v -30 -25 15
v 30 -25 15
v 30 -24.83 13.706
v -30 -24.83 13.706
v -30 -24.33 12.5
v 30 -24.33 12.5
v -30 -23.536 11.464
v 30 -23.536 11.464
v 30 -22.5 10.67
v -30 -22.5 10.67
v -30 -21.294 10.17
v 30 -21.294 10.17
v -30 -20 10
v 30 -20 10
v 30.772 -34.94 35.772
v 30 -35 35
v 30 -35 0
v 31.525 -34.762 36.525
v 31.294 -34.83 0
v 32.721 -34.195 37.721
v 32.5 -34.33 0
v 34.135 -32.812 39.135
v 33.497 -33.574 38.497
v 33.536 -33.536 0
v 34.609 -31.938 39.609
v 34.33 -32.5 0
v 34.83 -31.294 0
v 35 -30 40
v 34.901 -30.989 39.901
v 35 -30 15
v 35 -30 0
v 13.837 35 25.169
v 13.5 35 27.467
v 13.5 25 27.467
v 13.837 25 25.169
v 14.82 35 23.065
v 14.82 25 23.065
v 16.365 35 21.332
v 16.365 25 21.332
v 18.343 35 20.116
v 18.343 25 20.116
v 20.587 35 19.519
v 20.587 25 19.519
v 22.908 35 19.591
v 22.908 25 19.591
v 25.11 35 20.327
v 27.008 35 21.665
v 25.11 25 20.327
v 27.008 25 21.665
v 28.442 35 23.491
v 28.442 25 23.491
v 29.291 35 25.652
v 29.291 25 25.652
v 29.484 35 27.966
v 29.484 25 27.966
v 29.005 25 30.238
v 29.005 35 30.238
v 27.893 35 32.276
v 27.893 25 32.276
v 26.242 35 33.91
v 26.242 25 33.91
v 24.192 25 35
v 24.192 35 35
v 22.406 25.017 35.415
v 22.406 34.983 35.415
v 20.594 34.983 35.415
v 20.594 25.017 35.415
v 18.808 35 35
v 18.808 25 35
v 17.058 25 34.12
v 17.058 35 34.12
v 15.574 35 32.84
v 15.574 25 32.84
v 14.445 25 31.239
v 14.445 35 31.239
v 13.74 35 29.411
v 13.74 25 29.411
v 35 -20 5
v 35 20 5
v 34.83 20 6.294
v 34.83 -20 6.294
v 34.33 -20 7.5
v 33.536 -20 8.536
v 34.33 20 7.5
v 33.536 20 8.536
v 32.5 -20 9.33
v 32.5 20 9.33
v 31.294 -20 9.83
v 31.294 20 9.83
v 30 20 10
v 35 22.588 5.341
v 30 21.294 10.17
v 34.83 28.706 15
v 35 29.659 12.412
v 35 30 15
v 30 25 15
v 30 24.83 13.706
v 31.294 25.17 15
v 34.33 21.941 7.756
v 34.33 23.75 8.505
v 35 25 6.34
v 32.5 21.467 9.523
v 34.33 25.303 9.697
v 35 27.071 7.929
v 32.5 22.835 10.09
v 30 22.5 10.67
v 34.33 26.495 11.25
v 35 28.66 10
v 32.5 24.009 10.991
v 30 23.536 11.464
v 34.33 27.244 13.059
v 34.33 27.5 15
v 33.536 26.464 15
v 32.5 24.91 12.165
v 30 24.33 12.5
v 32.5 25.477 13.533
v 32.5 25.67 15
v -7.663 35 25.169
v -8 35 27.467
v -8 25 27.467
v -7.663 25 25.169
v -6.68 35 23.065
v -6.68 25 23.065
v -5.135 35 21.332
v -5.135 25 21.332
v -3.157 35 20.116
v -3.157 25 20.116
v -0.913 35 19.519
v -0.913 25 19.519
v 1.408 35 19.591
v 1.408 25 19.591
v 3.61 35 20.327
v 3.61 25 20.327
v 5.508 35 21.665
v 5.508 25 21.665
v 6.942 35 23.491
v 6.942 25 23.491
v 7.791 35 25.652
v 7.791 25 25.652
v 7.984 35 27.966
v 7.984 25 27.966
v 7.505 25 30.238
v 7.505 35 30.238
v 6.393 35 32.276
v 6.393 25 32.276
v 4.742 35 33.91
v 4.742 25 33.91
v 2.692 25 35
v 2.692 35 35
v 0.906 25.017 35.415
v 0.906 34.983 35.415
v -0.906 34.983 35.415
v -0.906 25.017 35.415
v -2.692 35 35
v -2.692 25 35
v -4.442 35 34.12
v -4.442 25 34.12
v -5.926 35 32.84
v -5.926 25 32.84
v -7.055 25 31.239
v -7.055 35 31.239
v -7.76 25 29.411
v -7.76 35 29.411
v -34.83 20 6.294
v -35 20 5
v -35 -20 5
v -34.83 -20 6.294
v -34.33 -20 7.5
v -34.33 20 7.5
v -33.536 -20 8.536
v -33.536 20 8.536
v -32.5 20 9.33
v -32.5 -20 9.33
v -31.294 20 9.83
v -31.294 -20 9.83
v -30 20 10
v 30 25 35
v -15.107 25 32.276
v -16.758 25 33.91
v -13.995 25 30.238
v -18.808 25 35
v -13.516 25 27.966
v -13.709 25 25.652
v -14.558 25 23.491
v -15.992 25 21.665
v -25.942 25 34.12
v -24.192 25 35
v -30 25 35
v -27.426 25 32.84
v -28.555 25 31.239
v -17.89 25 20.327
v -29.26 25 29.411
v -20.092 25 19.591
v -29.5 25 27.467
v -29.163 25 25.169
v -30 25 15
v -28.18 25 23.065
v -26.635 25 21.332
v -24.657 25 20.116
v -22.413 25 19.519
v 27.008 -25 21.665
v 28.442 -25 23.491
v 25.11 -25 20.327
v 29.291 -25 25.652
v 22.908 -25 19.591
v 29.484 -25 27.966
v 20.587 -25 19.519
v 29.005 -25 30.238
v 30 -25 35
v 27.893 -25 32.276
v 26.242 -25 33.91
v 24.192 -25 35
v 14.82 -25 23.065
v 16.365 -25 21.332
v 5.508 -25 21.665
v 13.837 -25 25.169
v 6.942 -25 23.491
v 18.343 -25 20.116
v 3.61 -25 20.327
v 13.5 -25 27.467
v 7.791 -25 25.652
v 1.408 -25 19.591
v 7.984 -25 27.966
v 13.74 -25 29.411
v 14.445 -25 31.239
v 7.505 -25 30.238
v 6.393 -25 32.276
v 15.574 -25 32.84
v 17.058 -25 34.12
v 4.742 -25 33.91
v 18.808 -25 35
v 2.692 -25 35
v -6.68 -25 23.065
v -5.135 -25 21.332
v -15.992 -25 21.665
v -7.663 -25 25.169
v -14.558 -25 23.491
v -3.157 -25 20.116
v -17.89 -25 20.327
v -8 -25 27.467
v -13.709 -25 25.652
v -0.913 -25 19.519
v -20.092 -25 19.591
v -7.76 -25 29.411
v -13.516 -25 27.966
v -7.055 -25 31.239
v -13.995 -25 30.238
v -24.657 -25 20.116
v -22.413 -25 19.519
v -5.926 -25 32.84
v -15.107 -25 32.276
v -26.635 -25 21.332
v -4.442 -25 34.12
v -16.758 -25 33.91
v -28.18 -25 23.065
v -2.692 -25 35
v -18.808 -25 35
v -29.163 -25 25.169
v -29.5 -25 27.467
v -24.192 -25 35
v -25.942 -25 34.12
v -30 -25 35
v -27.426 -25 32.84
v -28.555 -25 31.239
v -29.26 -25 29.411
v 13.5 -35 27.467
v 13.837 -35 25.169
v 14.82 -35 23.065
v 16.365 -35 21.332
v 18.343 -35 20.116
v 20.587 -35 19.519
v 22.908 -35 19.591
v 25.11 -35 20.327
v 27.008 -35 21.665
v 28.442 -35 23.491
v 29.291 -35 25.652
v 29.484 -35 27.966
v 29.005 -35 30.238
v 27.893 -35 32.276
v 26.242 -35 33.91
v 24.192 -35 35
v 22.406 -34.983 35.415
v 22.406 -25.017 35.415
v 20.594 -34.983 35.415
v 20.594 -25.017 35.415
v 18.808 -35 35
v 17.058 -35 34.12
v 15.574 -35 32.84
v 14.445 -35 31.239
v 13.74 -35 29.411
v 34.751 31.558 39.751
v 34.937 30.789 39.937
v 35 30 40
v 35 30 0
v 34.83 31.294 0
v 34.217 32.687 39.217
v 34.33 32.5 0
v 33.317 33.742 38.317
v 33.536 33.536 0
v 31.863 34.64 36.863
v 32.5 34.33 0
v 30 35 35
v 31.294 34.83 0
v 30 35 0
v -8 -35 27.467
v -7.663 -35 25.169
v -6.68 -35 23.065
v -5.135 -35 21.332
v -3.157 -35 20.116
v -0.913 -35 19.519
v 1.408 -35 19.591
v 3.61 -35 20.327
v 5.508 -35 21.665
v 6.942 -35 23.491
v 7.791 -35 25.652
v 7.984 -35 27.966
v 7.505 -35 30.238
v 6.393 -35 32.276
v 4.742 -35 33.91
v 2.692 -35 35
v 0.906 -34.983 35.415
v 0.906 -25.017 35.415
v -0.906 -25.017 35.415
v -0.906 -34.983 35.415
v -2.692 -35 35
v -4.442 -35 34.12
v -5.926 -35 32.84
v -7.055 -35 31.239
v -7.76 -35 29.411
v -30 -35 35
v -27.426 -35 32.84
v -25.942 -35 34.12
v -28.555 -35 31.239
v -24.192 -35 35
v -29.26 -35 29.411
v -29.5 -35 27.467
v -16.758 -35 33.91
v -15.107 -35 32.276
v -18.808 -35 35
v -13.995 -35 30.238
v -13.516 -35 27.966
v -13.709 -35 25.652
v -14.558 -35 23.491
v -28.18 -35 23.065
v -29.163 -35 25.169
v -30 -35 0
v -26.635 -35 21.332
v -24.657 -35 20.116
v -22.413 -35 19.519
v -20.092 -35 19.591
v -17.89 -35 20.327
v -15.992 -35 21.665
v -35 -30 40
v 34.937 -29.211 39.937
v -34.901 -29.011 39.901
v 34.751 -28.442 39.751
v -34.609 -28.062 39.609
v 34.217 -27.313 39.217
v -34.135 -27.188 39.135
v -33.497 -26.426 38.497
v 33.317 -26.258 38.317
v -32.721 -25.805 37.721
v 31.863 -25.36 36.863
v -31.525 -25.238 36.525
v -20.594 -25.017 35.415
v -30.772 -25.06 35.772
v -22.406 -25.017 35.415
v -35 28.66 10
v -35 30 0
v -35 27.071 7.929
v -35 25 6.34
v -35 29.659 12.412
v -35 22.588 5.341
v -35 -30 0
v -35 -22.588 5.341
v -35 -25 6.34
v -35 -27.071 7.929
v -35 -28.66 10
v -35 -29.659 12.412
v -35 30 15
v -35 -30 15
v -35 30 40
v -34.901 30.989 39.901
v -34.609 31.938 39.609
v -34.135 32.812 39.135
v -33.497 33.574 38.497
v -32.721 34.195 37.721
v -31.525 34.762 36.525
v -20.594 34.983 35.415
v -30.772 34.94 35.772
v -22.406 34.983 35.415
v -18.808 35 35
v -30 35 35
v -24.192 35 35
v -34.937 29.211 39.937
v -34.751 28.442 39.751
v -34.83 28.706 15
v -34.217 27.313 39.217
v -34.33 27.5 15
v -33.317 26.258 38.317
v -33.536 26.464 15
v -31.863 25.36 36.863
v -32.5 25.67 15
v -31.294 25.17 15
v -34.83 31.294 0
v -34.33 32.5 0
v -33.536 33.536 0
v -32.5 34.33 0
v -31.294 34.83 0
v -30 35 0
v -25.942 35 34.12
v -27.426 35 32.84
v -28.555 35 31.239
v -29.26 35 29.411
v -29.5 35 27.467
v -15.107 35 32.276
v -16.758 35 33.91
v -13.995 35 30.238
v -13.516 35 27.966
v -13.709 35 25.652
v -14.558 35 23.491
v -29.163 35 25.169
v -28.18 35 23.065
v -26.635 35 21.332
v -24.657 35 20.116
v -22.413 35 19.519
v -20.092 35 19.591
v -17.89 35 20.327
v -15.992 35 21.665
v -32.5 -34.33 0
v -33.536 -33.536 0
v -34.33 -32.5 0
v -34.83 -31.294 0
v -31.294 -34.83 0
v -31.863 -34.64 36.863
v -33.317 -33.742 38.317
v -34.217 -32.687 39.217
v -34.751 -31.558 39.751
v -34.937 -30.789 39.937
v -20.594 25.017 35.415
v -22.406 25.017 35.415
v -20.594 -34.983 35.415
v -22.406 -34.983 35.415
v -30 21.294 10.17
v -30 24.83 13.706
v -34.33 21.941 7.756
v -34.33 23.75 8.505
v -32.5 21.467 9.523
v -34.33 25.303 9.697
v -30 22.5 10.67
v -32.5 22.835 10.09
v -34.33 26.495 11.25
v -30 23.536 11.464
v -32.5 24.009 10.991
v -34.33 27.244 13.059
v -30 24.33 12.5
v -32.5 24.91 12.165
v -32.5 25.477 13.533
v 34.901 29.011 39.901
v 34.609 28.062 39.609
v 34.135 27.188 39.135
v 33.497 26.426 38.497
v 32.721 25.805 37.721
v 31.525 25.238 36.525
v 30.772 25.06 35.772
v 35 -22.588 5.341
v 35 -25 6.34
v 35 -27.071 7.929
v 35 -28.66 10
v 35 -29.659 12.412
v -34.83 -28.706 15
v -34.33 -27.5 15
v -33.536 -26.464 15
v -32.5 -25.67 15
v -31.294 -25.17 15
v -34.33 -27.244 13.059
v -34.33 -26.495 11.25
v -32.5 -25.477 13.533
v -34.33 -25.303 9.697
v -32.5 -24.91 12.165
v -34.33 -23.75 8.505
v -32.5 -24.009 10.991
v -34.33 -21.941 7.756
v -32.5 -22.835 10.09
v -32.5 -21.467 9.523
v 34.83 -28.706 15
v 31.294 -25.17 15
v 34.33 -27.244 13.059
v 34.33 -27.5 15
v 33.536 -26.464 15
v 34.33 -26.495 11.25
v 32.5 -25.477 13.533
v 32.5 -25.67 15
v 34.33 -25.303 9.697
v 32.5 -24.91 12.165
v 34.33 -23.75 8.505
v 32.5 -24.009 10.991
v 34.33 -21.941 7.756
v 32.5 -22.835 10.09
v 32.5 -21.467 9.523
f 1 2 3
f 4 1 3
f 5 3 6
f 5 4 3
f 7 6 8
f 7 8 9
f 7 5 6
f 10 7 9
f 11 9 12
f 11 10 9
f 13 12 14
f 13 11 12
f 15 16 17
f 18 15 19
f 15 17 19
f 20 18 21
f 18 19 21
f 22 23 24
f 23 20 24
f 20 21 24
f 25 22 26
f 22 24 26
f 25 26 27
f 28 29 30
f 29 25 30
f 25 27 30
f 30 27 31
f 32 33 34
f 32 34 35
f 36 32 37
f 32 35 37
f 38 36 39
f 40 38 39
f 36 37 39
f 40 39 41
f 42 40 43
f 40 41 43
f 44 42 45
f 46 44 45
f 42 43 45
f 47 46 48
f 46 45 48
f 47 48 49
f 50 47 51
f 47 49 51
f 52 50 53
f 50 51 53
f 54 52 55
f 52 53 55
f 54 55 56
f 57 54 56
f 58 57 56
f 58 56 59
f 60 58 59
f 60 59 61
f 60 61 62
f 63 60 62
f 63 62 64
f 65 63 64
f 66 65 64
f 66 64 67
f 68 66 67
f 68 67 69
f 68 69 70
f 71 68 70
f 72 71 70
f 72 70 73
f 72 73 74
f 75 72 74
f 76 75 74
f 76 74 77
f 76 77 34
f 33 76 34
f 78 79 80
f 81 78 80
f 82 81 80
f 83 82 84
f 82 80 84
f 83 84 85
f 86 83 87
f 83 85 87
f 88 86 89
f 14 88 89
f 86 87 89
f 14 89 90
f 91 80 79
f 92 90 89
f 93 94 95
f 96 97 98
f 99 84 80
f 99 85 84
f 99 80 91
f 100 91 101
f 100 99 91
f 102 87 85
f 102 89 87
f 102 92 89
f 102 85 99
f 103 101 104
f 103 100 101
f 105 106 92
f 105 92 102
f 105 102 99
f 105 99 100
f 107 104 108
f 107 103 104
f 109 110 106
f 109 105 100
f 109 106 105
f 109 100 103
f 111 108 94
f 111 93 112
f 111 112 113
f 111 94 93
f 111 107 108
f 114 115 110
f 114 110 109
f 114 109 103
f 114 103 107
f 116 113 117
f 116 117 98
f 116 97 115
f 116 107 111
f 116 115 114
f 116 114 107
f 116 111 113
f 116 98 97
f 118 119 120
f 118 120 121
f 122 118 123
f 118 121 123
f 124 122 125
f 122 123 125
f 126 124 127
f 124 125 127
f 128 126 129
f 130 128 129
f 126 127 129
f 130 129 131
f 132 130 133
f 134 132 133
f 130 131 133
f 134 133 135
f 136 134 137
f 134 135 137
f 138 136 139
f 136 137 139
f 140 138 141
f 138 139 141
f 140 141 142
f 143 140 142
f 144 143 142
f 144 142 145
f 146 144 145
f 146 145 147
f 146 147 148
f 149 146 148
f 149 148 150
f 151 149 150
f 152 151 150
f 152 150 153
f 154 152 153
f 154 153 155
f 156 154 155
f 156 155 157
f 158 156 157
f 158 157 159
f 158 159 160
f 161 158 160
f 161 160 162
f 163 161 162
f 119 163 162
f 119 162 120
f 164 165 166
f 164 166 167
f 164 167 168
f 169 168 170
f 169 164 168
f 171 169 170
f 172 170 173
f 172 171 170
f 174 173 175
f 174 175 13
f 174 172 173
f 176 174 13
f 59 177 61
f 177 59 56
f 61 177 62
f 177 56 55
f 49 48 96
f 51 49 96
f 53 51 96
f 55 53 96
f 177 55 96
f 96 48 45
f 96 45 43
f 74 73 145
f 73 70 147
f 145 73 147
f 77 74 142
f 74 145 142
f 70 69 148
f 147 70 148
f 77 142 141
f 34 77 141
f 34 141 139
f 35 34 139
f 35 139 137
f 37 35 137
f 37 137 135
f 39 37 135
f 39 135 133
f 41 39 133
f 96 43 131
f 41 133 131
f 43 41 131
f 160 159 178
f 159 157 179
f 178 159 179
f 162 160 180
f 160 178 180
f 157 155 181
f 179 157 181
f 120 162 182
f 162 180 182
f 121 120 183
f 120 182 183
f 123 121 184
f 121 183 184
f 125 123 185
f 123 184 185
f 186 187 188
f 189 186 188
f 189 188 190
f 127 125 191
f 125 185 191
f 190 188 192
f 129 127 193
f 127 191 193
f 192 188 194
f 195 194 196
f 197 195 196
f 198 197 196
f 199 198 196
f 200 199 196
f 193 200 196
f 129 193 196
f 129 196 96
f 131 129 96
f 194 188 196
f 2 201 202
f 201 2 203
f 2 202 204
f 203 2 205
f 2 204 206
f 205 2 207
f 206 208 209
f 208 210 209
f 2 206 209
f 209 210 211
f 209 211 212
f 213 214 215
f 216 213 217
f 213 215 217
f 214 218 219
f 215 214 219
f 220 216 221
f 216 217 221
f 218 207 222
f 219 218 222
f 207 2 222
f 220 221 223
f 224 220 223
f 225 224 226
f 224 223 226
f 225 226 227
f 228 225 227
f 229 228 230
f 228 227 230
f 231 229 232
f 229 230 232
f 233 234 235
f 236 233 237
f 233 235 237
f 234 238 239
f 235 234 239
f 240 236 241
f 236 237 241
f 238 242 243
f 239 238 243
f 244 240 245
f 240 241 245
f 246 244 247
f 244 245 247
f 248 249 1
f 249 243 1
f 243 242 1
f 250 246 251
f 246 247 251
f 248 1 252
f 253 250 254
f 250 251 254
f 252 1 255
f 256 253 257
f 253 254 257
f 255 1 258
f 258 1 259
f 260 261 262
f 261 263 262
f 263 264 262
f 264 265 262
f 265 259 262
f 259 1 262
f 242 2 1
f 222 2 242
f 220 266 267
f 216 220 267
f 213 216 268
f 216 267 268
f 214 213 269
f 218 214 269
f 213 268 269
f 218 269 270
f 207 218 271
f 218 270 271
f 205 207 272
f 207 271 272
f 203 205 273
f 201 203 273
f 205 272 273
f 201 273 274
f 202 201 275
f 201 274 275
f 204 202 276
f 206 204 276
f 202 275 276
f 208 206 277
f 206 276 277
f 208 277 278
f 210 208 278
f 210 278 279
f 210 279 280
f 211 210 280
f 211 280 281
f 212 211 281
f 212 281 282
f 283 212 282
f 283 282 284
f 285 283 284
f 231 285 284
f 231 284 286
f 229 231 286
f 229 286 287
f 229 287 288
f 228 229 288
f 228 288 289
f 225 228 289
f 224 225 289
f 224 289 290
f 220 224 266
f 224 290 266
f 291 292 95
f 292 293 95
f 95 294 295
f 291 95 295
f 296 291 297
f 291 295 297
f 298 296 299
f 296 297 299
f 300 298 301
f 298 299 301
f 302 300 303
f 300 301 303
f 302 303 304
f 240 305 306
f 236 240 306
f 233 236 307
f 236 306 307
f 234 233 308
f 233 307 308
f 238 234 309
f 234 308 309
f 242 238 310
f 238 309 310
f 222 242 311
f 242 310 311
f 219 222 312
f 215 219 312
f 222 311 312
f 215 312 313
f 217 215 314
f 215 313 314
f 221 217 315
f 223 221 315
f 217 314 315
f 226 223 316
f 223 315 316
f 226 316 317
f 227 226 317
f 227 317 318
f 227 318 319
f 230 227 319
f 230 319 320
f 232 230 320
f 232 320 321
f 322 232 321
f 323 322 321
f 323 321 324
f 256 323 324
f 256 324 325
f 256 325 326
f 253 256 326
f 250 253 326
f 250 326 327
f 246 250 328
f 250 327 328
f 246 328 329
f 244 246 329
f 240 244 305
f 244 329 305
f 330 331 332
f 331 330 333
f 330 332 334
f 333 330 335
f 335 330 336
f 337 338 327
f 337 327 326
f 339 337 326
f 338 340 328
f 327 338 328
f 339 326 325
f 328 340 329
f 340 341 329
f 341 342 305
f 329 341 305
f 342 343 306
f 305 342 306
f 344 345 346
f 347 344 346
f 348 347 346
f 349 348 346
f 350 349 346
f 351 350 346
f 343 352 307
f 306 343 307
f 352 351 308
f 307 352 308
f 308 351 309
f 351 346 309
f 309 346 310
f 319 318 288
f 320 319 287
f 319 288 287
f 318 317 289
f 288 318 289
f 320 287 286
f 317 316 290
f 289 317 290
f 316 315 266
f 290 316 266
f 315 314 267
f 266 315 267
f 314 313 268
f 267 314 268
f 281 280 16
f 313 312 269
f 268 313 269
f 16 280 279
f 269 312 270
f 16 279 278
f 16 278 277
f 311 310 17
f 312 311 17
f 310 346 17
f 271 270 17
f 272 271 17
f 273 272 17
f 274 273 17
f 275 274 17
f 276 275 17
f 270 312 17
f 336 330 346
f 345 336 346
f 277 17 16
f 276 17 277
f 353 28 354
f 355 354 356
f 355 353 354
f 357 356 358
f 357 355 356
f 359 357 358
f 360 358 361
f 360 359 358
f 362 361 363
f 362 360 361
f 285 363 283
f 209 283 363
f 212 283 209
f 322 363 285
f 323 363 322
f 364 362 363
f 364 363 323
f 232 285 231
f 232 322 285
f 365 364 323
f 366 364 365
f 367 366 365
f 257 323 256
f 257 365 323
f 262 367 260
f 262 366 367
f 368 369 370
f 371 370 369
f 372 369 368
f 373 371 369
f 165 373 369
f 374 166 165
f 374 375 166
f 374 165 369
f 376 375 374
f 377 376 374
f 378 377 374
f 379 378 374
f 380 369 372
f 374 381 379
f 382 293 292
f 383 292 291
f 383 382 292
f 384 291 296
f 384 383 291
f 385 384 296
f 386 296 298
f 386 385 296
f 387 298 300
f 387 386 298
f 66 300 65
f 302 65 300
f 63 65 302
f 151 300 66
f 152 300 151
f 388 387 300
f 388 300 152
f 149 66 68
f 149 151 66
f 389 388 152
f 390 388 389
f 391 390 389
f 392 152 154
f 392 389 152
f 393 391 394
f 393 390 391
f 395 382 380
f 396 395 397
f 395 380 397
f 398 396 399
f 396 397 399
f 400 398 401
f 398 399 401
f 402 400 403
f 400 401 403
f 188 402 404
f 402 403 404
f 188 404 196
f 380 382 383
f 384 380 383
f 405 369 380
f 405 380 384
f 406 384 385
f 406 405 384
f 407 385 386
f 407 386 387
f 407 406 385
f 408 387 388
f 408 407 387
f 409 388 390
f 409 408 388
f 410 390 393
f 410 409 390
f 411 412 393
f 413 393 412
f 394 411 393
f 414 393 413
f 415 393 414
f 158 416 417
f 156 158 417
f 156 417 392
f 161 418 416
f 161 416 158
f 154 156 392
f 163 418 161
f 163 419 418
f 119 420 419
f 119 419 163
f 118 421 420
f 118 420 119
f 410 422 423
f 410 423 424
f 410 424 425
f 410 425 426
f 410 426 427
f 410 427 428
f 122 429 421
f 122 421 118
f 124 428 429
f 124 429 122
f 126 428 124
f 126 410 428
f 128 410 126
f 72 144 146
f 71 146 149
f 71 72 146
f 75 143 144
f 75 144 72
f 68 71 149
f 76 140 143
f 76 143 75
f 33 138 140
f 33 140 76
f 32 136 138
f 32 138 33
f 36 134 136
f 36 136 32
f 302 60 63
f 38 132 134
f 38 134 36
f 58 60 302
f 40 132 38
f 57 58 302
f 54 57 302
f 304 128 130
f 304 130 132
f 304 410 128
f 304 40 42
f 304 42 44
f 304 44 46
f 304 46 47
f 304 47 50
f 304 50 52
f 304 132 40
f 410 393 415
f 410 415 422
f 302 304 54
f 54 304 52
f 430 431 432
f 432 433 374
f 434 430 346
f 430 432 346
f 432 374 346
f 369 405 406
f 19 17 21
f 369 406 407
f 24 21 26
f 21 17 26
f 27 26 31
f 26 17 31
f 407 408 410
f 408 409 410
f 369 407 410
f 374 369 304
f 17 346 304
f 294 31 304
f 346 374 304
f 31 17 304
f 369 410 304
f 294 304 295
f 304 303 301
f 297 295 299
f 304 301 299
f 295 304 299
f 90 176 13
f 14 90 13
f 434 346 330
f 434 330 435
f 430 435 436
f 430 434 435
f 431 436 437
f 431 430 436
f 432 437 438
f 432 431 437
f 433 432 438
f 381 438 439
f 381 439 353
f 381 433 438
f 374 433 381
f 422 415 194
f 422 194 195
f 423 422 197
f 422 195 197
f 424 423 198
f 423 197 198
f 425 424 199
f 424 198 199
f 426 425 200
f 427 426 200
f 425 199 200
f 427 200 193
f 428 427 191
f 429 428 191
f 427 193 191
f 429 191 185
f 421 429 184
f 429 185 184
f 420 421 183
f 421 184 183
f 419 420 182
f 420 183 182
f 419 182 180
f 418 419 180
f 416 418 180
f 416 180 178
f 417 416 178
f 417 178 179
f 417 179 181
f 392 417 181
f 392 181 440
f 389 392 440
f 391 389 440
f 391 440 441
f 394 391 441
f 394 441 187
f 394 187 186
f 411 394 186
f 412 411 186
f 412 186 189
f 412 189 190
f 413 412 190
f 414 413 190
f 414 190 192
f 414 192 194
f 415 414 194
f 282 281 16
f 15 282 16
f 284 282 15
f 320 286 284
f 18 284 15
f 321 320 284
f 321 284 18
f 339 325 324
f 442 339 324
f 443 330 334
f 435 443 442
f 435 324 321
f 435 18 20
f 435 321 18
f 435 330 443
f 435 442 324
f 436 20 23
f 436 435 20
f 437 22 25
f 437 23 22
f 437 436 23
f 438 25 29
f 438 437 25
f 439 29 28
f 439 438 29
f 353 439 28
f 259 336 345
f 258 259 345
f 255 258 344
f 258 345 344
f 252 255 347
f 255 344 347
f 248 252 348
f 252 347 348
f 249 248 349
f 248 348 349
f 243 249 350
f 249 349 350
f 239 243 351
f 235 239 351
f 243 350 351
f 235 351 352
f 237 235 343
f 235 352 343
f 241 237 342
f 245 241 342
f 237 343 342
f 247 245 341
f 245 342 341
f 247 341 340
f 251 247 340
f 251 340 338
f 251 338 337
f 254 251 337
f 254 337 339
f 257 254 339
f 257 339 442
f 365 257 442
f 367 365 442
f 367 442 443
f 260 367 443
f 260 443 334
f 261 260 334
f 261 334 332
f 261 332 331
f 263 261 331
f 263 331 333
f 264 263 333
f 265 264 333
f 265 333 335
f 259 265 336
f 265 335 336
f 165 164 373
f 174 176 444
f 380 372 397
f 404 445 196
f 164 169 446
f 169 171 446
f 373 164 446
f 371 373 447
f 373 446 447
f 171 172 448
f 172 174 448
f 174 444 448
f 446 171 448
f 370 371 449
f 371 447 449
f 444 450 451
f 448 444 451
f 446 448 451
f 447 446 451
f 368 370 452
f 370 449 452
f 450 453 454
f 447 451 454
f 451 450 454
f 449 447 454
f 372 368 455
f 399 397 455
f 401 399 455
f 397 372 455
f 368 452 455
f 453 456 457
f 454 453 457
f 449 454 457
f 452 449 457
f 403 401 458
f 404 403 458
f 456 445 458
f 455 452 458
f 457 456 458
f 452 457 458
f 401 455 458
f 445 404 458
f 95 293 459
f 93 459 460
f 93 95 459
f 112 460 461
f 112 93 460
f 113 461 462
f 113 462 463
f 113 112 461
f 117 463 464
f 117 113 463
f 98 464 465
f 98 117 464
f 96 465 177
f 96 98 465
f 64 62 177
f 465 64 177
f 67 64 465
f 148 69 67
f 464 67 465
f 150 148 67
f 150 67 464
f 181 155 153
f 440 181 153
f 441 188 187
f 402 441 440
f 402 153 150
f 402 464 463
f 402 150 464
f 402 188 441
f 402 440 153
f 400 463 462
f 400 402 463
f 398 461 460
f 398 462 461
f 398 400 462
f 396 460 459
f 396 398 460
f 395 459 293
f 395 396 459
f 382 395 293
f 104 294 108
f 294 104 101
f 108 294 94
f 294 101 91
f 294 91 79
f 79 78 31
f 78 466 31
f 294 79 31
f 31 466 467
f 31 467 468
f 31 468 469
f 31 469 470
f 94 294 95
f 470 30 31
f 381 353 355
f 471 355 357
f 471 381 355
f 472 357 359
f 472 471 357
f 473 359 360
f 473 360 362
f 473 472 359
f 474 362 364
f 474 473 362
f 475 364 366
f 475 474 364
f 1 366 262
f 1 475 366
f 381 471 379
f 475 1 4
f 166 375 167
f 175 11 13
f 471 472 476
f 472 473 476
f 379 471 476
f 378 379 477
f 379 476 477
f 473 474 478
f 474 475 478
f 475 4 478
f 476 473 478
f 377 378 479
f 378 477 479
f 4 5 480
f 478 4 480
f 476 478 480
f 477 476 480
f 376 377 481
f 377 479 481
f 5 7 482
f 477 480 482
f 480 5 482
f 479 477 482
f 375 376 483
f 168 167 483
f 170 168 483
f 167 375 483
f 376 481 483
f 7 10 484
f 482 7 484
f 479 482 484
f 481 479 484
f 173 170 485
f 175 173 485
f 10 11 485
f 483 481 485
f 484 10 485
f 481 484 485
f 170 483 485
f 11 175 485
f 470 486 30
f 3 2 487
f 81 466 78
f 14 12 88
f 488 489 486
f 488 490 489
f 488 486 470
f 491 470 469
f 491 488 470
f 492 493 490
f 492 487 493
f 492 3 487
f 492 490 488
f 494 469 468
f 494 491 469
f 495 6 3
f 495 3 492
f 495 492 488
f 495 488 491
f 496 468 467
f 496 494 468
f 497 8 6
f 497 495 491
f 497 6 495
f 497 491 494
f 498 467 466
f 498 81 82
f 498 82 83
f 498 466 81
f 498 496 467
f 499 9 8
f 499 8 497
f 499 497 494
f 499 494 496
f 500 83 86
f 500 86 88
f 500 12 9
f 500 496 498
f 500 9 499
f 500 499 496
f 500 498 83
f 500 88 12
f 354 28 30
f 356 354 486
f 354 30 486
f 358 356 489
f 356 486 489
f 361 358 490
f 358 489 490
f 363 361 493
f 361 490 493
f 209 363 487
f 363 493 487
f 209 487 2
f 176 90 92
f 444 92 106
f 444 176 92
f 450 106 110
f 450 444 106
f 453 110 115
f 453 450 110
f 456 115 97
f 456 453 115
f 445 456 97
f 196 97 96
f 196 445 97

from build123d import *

# Parameters (mm, degrees)
F0_W         = 70
F0_H         = 70
F1_DEPTH     = 40
F3_DEPTH     = 78
F4_W         = 25
F4_H         = 17.3788098246
F5_DEPTH     = 72.2
F6_T1_DEPTH  = 70
F6_T3_DEPTH  = 40
F6_T5_DEPTH  = 65
F6_T7_DEPTH  = 37.5
F6_T9_DEPTH  = 95
F6_T12_ANGLE = 90
F6_T14_ANGLE = 90
F6_T16_ANGLE = 90
F6_T18_ANGLE = 90


# Not quite as in the source:
# - a fillet or chamfer that OpenCascade refuses, or shapes differently, is made with other operations: its cross-section is extruded or revolved along the edge and cut away or added
# - a feature names something its author has since deleted; it is built from what else it names


with BuildPart() as f1:
    # F0 (on Top) → F1 (new body)
    with BuildSketch(Plane.XY):
        Rectangle(F0_W, F0_H)
    extrude(amount=F1_DEPTH)

    # F2 (on face) → F3 (cut)
    with BuildSketch(Plane.XZ.offset(35)):
        with BuildLine():
            ThreePointArc((29.5, 27.4665858597), (21.5, 35.4665858597), (13.5, 27.4665858597))
            ThreePointArc((13.5, 27.4665858597), (21.5, 19.4665858597), (29.5, 27.4665858597))
        make_face()
        with BuildLine():
            ThreePointArc((8, 27.4665858597), (0, 35.4665858597), (-8, 27.4665858597))
            ThreePointArc((-8, 27.4665858597), (0, 19.4665858597), (8, 27.4665858597))
        make_face()
        with BuildLine():
            ThreePointArc((-13.5, 27.4665858597), (-21.5, 35.4665858597), (-29.5, 27.4665858597))
            ThreePointArc((-29.5, 27.4665858597), (-21.5, 19.4665858597), (-13.5, 27.4665858597))
        make_face()
    extrude(amount=-F3_DEPTH, mode=Mode.SUBTRACT)

    # F4 (on face) → F5 (cut)
    with BuildSketch(Plane(origin=(-35, 0, 0), x_dir=(0, -1, 0), z_dir=(-1, 0, 0))):
        with Locations((-12.5, 31.3105950877)):
            Rectangle(F4_W, F4_H)
        with Locations((12.5, 31.3105950877)):
            Rectangle(F4_W, F4_H)
        Polygon((25, 22.6211901754), (0, 22.6211901754), (-25, 22.6211901754), (-25, 10), (25, 10), align=None)
    extrude(amount=-F5_DEPTH, mode=Mode.SUBTRACT)

    # F6: fillet of radius 5 on 16 edges, made by hand

    # F6_s2 → F6_t1 (join)
    with BuildSketch(Plane.YZ.offset(-35)):
        with BuildLine():
            ThreePointArc((20, 10), (23.5355339059, 11.4644660941), (25, 15))
            Line((25, 15), (25, 10))
            Line((25, 10), (20, 10))
        make_face()
        with BuildLine():
            ThreePointArc((-25, 15), (-23.5355339059, 11.4644660941), (-20, 10))
            Line((-20, 10), (-25, 10))
            Line((-25, 10), (-25, 15))
        make_face()
    extrude(amount=F6_T1_DEPTH)

    # F6_s4 → F6_t3 (cut)
    with BuildSketch(Plane.XZ.offset(-20)):
        with BuildLine():
            ThreePointArc((35, 5), (33.5355339059, 8.5355339059), (30, 10))
            Line((30, 10), (35, 10))
            Line((35, 10), (35, 5))
        make_face()
        with BuildLine():
            ThreePointArc((-35, 5), (-33.5355339059, 8.5355339059), (-30, 10))
            Line((-30, 10), (-35, 10))
            Line((-35, 10), (-35, 5))
        make_face()
    extrude(amount=F6_T3_DEPTH, mode=Mode.SUBTRACT)

    # F6_s6 → F6_t5 (cut)
    with BuildSketch(Plane.XY.offset(-12.5)):
        with BuildLine():
            ThreePointArc((30, -35), (33.5355339059, -33.5355339059), (35, -30))
            Line((35, -30), (35, -35))
            Line((35, -35), (30, -35))
        make_face()
        with BuildLine():
            ThreePointArc((35, 30), (33.5355339059, 33.5355339059), (30, 35))
            Line((30, 35), (35, 35))
            Line((35, 35), (35, 30))
        make_face()
        with BuildLine():
            ThreePointArc((-35, 30), (-33.5355339059, 33.5355339059), (-30, 35))
            Line((-30, 35), (-35, 35))
            Line((-35, 35), (-35, 30))
        make_face()
        with BuildLine():
            ThreePointArc((-30, -35), (-33.5355339059, -33.5355339059), (-35, -30))
            Line((-35, -30), (-35, -35))
            Line((-35, -35), (-30, -35))
        make_face()
    extrude(amount=F6_T5_DEPTH, mode=Mode.SUBTRACT)

    # F6_s8 → F6_t7 (cut)
    with BuildSketch(Plane.XY.offset(15)):
        with BuildLine():
            ThreePointArc((-35, 30), (-33.5355339059, 26.4644660941), (-30, 25))
            Line((-30, 25), (-35, 25))
            Line((-35, 25), (-35, 30))
        make_face()
        with BuildLine():
            ThreePointArc((-35, -30), (-33.5355339059, -26.4644660941), (-30, -25))
            Line((-30, -25), (-35, -25))
            Line((-35, -25), (-35, -30))
        make_face()
        with BuildLine():
            ThreePointArc((35, 30), (33.5355339059, 26.4644660941), (30, 25))
            Line((30, 25), (35, 25))
            Line((35, 25), (35, 30))
        make_face()
        with BuildLine():
            ThreePointArc((35, -30), (33.5355339059, -26.4644660941), (30, -25))
            Line((30, -25), (35, -25))
            Line((35, -25), (35, -30))
        make_face()
    extrude(amount=F6_T7_DEPTH, mode=Mode.SUBTRACT)

    # F6_s10 → F6_t9 (cut)
    with BuildSketch(Plane.YZ.offset(-47.5)):
        with BuildLine():
            ThreePointArc((-30, 40), (-26.4644660941, 38.5355339059), (-25, 35))
            Line((-25, 35), (-25, 40))
            Line((-25, 40), (-30, 40))
        make_face()
        with BuildLine():
            ThreePointArc((-35, 35), (-33.5355339059, 38.5355339059), (-30, 40))
            Line((-30, 40), (-35, 40))
            Line((-35, 40), (-35, 35))
        make_face()
        with BuildLine():
            ThreePointArc((30, 40), (33.5355339059, 38.5355339059), (35, 35))
            Line((35, 35), (35, 40))
            Line((35, 40), (30, 40))
        make_face()
        with BuildLine():
            ThreePointArc((25, 35), (26.4644660941, 38.5355339059), (30, 40))
            Line((30, 40), (25, 40))
            Line((25, 40), (25, 35))
        make_face()
    extrude(amount=F6_T9_DEPTH, mode=Mode.SUBTRACT)

    # F6_s11 → F6_t12 (revolve, cut)
    with BuildSketch(Plane.XY.offset(15)):
        with BuildLine():
            ThreePointArc((35, -30), (33.5355339059, -26.4644660941), (30, -25))
            Line((30, -25), (35, -25))
            Line((35, -25), (35, -30))
        make_face()
    revolve(axis=Axis((35, -20, 15), (1, 0, 0)), revolution_arc=F6_T12_ANGLE, mode=Mode.SUBTRACT)

    # F6_s13 → F6_t14 (revolve, cut)
    with BuildSketch(Plane.XZ.offset(-20)):
        with BuildLine():
            ThreePointArc((35, 5), (33.5355339059, 8.5355339059), (30, 10))
            Line((30, 10), (35, 10))
            Line((35, 10), (35, 5))
        make_face()
    revolve(axis=Axis((35, 20, 15), (1, 0, 0)), revolution_arc=F6_T14_ANGLE, mode=Mode.SUBTRACT)

    # F6_s15 → F6_t16 (revolve, cut)
    with BuildSketch(Plane.XZ.offset(-20)):
        with BuildLine():
            ThreePointArc((-35, 5), (-33.5355339059, 8.5355339059), (-30, 10))
            Line((-30, 10), (-35, 10))
            Line((-35, 10), (-35, 5))
        make_face()
    revolve(axis=Axis((-35, 20, 15), (1, 0, 0)), revolution_arc=F6_T16_ANGLE, mode=Mode.SUBTRACT)

    # F6_s17 → F6_t18 (revolve, cut)
    with BuildSketch(Plane.XY.offset(15)):
        with BuildLine():
            ThreePointArc((-35, -30), (-33.5355339059, -26.4644660941), (-30, -25))
            Line((-30, -25), (-35, -25))
            Line((-35, -25), (-35, -30))
        make_face()
    revolve(axis=Axis((-35, -20, 15), (1, 0, 0)), revolution_arc=F6_T18_ANGLE, mode=Mode.SUBTRACT)


solid = f1.part
